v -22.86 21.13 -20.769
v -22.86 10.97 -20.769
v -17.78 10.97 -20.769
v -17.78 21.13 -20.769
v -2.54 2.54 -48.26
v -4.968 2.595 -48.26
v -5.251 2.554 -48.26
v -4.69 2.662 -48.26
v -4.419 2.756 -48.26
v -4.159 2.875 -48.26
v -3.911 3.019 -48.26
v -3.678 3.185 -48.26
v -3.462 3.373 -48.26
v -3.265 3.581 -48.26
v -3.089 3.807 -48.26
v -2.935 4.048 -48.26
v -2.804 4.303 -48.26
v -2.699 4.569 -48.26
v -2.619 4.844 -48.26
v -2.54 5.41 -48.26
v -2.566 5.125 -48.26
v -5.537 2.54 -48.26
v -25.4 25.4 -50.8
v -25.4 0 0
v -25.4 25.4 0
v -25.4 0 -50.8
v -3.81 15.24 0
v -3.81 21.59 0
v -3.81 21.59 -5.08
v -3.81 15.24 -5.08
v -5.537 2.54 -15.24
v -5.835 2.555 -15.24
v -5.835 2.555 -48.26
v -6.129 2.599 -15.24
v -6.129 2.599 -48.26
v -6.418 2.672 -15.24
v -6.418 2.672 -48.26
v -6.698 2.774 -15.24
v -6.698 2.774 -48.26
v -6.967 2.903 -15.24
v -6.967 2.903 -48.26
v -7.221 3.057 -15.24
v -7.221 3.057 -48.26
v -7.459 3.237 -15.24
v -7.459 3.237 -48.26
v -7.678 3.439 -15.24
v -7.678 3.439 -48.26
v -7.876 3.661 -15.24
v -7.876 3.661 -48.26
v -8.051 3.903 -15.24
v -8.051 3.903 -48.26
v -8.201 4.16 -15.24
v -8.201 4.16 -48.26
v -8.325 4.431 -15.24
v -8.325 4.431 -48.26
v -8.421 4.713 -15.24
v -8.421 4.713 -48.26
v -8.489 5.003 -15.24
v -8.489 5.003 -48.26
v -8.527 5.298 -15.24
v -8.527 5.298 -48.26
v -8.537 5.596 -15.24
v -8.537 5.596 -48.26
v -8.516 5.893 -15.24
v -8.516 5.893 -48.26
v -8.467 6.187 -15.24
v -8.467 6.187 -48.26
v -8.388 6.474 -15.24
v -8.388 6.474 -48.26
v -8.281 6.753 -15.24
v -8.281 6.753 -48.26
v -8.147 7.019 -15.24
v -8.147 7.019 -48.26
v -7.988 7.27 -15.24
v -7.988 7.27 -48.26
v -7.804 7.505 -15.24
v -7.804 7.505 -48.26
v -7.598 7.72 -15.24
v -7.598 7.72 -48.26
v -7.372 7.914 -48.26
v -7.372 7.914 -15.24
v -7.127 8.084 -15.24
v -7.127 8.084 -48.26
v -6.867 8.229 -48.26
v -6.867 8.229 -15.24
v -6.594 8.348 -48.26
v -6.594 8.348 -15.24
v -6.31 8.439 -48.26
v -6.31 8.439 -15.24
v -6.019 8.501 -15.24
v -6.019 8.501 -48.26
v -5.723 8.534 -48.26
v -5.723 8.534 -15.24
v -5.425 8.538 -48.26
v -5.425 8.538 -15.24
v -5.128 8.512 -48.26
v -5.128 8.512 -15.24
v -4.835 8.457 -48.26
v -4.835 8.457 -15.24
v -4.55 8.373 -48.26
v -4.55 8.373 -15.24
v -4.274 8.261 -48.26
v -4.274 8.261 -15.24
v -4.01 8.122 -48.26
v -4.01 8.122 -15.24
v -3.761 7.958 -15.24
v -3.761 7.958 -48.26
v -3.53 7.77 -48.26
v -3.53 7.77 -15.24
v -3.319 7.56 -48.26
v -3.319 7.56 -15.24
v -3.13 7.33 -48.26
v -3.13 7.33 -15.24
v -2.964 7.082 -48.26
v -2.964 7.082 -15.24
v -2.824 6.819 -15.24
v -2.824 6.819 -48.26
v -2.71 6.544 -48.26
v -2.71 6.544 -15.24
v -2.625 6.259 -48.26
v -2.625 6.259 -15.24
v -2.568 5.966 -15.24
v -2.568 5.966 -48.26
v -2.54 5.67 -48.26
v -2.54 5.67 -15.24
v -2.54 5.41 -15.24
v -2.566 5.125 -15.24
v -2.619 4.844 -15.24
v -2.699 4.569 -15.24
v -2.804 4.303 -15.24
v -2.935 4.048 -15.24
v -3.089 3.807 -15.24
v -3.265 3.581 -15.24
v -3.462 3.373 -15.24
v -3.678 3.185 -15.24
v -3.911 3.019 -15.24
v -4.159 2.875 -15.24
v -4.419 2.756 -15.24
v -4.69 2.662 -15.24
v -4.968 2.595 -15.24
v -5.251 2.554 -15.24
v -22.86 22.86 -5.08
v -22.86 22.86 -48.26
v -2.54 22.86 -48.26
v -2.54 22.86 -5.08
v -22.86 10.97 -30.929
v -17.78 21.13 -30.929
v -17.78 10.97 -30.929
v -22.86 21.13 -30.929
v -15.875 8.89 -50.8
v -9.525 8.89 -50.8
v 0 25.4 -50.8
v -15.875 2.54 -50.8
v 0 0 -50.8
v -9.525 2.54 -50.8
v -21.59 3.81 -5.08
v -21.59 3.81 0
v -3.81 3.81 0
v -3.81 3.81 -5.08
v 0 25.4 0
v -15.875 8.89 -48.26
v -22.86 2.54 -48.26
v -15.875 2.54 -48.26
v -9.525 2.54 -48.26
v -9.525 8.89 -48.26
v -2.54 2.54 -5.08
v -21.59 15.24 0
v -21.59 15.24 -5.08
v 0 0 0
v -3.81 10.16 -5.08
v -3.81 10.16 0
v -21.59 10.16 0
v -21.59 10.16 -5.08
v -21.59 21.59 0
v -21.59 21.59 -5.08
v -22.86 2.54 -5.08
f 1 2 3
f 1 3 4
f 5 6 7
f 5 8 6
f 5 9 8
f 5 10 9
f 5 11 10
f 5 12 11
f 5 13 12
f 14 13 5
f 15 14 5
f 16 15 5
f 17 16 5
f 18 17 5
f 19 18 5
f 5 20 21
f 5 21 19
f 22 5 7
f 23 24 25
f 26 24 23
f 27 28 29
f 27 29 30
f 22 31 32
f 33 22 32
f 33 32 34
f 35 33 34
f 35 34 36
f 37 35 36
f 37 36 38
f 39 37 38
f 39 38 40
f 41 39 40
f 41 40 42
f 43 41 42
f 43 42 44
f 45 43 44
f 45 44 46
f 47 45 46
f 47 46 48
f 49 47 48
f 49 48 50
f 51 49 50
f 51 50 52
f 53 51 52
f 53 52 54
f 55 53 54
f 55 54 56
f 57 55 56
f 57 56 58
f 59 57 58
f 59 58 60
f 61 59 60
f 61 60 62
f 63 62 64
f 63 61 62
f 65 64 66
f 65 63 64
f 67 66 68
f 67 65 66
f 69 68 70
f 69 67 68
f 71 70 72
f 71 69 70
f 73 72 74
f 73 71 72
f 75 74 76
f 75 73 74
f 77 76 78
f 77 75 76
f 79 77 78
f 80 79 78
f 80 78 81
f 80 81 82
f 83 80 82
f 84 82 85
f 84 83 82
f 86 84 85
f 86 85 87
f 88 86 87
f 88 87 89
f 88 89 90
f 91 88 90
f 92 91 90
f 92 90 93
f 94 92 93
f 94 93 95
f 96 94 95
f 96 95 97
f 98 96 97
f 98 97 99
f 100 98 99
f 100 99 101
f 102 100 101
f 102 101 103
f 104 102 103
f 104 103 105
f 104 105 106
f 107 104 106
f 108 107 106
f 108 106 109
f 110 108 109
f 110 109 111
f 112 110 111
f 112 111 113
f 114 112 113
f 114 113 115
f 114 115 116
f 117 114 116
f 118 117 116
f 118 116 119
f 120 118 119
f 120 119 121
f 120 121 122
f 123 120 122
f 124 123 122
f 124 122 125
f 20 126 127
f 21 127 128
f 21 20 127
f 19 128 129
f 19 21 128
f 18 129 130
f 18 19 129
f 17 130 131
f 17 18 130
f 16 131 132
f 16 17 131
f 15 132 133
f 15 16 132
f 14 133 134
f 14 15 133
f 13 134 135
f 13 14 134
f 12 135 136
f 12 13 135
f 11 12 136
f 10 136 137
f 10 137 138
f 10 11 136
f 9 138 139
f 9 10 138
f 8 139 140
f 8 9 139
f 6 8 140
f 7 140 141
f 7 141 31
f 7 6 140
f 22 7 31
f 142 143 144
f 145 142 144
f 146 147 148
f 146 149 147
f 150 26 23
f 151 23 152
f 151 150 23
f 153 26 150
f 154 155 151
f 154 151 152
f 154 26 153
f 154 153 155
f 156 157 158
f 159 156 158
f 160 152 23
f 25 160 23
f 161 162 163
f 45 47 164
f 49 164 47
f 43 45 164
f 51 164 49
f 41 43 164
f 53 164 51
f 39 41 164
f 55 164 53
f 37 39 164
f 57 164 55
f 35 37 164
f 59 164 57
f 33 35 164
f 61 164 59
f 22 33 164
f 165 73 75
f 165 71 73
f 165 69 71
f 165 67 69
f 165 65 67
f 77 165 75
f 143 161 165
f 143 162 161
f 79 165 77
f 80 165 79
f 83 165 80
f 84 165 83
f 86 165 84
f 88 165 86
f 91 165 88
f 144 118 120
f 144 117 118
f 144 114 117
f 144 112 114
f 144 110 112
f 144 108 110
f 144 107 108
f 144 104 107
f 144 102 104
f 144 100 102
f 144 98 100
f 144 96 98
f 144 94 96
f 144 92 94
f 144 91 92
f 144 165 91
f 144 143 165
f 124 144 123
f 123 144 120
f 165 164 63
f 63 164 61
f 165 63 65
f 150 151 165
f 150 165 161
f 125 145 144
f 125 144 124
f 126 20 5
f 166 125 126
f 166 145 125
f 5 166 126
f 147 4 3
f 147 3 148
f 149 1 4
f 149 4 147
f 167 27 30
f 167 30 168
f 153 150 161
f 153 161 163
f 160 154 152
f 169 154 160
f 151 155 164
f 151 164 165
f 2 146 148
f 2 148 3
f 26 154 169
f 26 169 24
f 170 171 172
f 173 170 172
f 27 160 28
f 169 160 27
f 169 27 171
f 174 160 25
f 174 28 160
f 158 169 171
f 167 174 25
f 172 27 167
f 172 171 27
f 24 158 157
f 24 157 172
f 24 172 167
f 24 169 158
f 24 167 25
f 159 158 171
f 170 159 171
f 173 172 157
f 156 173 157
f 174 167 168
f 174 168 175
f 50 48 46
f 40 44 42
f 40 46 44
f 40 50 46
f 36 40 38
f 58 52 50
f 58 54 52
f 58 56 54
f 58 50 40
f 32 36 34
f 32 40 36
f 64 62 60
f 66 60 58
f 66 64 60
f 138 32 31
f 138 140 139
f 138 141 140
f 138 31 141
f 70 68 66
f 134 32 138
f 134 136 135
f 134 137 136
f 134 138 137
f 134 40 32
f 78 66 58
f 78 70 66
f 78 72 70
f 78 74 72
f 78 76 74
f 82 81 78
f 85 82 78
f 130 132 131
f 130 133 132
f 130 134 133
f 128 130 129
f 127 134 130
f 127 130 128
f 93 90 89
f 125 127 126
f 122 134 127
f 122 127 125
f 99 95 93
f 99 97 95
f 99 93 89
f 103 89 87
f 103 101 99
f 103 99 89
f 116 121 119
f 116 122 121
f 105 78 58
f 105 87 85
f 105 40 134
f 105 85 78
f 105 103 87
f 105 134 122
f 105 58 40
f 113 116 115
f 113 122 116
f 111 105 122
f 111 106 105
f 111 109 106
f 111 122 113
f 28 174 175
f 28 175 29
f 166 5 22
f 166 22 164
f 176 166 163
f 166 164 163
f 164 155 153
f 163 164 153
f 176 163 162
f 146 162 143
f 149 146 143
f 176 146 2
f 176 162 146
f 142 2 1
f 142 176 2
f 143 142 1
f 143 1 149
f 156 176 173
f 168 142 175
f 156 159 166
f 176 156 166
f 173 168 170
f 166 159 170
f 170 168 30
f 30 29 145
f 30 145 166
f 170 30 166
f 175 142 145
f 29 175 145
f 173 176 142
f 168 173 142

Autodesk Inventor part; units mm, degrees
ref_plane "YZ Plane" through (0, 0, 0) normal (1, 0, 0) x (0, 1, 0)
ref_plane "XZ Plane" through (0, 0, 0) normal (0, 1, 0) x (-1, 0, 0)
sketch "Sketch1" plane through (0, 0, 0) normal (0, 1, 0) x (-1, 0, 0)
  point P0 (0, 0)
sketch "Sketch2" plane through (0, 0, 0) normal (0, 1, 0) x (-1, 0, 0)
  line L0 (0, 0) -> (25.4, 0)
  line L1 (25.4, 0) -> (25.4, -50.8)
  line L2 (25.4, -50.8) -> (0, -50.8)
  line L3 (0, -50.8) -> (0, 0)
  dimension "d0" = 25.4
  dimension "d1" = 50.8
extrude "Extrusion1" add sketch "Sketch2" along normal blind 25.4
sketch "Sketch3" plane through (-25.4, 0, 0) normal (0, 0, 1) x (1, 0, 0)
  line L0 (0, 25.4) -> (25.4, 25.4) projected
  line L1 (0, 0) -> (0, 25.4) projected
  line L2 (25.4, 0) -> (25.4, 25.4) projected
  line L3 (3.81, 21.59) -> (21.59, 21.59)
  line L4 (21.59, 21.59) -> (21.59, 15.24)
  line L5 (21.59, 15.24) -> (3.81, 15.24)
  line L6 (3.81, 15.24) -> (3.81, 21.59)
  line L7 (25.4, 0) -> (0, 0) projected
  line L8 (3.81, 3.81) -> (21.59, 3.81)
  line L9 (21.59, 3.81) -> (21.59, 10.16)
  line L10 (21.59, 10.16) -> (3.81, 10.16)
  line L11 (3.81, 10.16) -> (3.81, 3.81)
  dimension "d4" = 3.81
  dimension "d5" = 3.81
  dimension "d6" = 3.81
  dimension "d7" = 6.35
  dimension "d8" = 3.81
  dimension "d9" = 6.35
extrude "Extrusion2" cut sketch "Sketch3" against normal blind 5.08 contours L3 L4 L5 L6 | L11 L10 L9 L8
ref_plane "Work Plane1" through (-25.4, 0, -5.08) normal (0, 0, 1) x (1, 0, 0)
sketch "Sketch4" plane through (-25.4, 0, -5.08) normal (0, 0, 1) x (1, 0, 0)
  line L0 (2.54, 22.86) -> (22.86, 22.86)
  line L1 (22.86, 22.86) -> (22.86, 2.54)
  line L2 (22.86, 2.54) -> (2.54, 2.54)
  line L3 (2.54, 2.54) -> (2.54, 22.86)
  line L4 (0, 25.4) -> (25.4, 25.4) projected
  line L5 (0, 0) -> (0, 25.4) projected
  line L6 (25.4, 0) -> (25.4, 25.4) projected
  line L7 (25.4, 0) -> (0, 0) projected
  dimension "d13" = 2.54
  dimension "d14" = 2.54
  dimension "d15" = 2.54
  dimension "d16" = 2.54
extrude "Extrusion3" cut sketch "Sketch4" against normal blind 43.18 contours L0 L1 L2 L3
sketch "Sketch5" plane through (0, 0, -50.8) normal (0, 0, -1) x (-1, 0, 0)
  line L0 (2.54, 2.54) -> (22.86, 2.54) projected
  line L1 (9.525, 8.89) -> (15.875, 8.89)
  line L2 (15.875, 8.89) -> (15.875, 2.54)
  line L3 (15.875, 2.54) -> (9.525, 2.54)
  line L4 (9.525, 2.54) -> (9.525, 8.89)
  line L5 (0, 0) -> (0, 25.4) projected
  dimension "d19" = 6.35
  dimension "d20" = 6.35
  dimension "d21" = 9.525
extrude "Extrusion4" cut sketch "Sketch5" against normal blind 12.7
sketch "Sketch6" plane through (-22.86, 2.54, -5.08) normal (1, 0, 0) x (0, 0, -1)
  line L0 (15.6891, 18.5897) -> (25.8491, 18.5897)
  line L1 (25.8491, 18.5897) -> (25.8491, 8.4297)
  line L2 (25.8491, 8.4297) -> (15.6891, 8.4297)
  line L3 (15.6891, 8.4297) -> (15.6891, 18.5897)
  point P0 (-5.08, -2.54)
  dimension "d24" = 10.16
  dimension "d25" = 10.16
extrude "Extrusion5" add sketch "Sketch6" along normal blind 5.08
sketch "Sketch7" plane through (-25.4, 0, -48.26) normal (0, 0, 1) x (1, 0, 0)
  line L0 (22.86, 2.54) -> (15.875, 2.54) projected
  line L1 (22.86, 22.86) -> (22.86, 2.54) projected
  circle A0 centre (19.8628, 5.54) radius 3
  point P0 (25.4, 0)
  dimension "d28" = 3
  dimension "d29" = 2.9972
  dimension "d30" = 6
extrude "Extrusion6" add sketch "Sketch7" along normal blind 33.02 contours A0 L1 | L1 A0
properties part number "sensor pod"
